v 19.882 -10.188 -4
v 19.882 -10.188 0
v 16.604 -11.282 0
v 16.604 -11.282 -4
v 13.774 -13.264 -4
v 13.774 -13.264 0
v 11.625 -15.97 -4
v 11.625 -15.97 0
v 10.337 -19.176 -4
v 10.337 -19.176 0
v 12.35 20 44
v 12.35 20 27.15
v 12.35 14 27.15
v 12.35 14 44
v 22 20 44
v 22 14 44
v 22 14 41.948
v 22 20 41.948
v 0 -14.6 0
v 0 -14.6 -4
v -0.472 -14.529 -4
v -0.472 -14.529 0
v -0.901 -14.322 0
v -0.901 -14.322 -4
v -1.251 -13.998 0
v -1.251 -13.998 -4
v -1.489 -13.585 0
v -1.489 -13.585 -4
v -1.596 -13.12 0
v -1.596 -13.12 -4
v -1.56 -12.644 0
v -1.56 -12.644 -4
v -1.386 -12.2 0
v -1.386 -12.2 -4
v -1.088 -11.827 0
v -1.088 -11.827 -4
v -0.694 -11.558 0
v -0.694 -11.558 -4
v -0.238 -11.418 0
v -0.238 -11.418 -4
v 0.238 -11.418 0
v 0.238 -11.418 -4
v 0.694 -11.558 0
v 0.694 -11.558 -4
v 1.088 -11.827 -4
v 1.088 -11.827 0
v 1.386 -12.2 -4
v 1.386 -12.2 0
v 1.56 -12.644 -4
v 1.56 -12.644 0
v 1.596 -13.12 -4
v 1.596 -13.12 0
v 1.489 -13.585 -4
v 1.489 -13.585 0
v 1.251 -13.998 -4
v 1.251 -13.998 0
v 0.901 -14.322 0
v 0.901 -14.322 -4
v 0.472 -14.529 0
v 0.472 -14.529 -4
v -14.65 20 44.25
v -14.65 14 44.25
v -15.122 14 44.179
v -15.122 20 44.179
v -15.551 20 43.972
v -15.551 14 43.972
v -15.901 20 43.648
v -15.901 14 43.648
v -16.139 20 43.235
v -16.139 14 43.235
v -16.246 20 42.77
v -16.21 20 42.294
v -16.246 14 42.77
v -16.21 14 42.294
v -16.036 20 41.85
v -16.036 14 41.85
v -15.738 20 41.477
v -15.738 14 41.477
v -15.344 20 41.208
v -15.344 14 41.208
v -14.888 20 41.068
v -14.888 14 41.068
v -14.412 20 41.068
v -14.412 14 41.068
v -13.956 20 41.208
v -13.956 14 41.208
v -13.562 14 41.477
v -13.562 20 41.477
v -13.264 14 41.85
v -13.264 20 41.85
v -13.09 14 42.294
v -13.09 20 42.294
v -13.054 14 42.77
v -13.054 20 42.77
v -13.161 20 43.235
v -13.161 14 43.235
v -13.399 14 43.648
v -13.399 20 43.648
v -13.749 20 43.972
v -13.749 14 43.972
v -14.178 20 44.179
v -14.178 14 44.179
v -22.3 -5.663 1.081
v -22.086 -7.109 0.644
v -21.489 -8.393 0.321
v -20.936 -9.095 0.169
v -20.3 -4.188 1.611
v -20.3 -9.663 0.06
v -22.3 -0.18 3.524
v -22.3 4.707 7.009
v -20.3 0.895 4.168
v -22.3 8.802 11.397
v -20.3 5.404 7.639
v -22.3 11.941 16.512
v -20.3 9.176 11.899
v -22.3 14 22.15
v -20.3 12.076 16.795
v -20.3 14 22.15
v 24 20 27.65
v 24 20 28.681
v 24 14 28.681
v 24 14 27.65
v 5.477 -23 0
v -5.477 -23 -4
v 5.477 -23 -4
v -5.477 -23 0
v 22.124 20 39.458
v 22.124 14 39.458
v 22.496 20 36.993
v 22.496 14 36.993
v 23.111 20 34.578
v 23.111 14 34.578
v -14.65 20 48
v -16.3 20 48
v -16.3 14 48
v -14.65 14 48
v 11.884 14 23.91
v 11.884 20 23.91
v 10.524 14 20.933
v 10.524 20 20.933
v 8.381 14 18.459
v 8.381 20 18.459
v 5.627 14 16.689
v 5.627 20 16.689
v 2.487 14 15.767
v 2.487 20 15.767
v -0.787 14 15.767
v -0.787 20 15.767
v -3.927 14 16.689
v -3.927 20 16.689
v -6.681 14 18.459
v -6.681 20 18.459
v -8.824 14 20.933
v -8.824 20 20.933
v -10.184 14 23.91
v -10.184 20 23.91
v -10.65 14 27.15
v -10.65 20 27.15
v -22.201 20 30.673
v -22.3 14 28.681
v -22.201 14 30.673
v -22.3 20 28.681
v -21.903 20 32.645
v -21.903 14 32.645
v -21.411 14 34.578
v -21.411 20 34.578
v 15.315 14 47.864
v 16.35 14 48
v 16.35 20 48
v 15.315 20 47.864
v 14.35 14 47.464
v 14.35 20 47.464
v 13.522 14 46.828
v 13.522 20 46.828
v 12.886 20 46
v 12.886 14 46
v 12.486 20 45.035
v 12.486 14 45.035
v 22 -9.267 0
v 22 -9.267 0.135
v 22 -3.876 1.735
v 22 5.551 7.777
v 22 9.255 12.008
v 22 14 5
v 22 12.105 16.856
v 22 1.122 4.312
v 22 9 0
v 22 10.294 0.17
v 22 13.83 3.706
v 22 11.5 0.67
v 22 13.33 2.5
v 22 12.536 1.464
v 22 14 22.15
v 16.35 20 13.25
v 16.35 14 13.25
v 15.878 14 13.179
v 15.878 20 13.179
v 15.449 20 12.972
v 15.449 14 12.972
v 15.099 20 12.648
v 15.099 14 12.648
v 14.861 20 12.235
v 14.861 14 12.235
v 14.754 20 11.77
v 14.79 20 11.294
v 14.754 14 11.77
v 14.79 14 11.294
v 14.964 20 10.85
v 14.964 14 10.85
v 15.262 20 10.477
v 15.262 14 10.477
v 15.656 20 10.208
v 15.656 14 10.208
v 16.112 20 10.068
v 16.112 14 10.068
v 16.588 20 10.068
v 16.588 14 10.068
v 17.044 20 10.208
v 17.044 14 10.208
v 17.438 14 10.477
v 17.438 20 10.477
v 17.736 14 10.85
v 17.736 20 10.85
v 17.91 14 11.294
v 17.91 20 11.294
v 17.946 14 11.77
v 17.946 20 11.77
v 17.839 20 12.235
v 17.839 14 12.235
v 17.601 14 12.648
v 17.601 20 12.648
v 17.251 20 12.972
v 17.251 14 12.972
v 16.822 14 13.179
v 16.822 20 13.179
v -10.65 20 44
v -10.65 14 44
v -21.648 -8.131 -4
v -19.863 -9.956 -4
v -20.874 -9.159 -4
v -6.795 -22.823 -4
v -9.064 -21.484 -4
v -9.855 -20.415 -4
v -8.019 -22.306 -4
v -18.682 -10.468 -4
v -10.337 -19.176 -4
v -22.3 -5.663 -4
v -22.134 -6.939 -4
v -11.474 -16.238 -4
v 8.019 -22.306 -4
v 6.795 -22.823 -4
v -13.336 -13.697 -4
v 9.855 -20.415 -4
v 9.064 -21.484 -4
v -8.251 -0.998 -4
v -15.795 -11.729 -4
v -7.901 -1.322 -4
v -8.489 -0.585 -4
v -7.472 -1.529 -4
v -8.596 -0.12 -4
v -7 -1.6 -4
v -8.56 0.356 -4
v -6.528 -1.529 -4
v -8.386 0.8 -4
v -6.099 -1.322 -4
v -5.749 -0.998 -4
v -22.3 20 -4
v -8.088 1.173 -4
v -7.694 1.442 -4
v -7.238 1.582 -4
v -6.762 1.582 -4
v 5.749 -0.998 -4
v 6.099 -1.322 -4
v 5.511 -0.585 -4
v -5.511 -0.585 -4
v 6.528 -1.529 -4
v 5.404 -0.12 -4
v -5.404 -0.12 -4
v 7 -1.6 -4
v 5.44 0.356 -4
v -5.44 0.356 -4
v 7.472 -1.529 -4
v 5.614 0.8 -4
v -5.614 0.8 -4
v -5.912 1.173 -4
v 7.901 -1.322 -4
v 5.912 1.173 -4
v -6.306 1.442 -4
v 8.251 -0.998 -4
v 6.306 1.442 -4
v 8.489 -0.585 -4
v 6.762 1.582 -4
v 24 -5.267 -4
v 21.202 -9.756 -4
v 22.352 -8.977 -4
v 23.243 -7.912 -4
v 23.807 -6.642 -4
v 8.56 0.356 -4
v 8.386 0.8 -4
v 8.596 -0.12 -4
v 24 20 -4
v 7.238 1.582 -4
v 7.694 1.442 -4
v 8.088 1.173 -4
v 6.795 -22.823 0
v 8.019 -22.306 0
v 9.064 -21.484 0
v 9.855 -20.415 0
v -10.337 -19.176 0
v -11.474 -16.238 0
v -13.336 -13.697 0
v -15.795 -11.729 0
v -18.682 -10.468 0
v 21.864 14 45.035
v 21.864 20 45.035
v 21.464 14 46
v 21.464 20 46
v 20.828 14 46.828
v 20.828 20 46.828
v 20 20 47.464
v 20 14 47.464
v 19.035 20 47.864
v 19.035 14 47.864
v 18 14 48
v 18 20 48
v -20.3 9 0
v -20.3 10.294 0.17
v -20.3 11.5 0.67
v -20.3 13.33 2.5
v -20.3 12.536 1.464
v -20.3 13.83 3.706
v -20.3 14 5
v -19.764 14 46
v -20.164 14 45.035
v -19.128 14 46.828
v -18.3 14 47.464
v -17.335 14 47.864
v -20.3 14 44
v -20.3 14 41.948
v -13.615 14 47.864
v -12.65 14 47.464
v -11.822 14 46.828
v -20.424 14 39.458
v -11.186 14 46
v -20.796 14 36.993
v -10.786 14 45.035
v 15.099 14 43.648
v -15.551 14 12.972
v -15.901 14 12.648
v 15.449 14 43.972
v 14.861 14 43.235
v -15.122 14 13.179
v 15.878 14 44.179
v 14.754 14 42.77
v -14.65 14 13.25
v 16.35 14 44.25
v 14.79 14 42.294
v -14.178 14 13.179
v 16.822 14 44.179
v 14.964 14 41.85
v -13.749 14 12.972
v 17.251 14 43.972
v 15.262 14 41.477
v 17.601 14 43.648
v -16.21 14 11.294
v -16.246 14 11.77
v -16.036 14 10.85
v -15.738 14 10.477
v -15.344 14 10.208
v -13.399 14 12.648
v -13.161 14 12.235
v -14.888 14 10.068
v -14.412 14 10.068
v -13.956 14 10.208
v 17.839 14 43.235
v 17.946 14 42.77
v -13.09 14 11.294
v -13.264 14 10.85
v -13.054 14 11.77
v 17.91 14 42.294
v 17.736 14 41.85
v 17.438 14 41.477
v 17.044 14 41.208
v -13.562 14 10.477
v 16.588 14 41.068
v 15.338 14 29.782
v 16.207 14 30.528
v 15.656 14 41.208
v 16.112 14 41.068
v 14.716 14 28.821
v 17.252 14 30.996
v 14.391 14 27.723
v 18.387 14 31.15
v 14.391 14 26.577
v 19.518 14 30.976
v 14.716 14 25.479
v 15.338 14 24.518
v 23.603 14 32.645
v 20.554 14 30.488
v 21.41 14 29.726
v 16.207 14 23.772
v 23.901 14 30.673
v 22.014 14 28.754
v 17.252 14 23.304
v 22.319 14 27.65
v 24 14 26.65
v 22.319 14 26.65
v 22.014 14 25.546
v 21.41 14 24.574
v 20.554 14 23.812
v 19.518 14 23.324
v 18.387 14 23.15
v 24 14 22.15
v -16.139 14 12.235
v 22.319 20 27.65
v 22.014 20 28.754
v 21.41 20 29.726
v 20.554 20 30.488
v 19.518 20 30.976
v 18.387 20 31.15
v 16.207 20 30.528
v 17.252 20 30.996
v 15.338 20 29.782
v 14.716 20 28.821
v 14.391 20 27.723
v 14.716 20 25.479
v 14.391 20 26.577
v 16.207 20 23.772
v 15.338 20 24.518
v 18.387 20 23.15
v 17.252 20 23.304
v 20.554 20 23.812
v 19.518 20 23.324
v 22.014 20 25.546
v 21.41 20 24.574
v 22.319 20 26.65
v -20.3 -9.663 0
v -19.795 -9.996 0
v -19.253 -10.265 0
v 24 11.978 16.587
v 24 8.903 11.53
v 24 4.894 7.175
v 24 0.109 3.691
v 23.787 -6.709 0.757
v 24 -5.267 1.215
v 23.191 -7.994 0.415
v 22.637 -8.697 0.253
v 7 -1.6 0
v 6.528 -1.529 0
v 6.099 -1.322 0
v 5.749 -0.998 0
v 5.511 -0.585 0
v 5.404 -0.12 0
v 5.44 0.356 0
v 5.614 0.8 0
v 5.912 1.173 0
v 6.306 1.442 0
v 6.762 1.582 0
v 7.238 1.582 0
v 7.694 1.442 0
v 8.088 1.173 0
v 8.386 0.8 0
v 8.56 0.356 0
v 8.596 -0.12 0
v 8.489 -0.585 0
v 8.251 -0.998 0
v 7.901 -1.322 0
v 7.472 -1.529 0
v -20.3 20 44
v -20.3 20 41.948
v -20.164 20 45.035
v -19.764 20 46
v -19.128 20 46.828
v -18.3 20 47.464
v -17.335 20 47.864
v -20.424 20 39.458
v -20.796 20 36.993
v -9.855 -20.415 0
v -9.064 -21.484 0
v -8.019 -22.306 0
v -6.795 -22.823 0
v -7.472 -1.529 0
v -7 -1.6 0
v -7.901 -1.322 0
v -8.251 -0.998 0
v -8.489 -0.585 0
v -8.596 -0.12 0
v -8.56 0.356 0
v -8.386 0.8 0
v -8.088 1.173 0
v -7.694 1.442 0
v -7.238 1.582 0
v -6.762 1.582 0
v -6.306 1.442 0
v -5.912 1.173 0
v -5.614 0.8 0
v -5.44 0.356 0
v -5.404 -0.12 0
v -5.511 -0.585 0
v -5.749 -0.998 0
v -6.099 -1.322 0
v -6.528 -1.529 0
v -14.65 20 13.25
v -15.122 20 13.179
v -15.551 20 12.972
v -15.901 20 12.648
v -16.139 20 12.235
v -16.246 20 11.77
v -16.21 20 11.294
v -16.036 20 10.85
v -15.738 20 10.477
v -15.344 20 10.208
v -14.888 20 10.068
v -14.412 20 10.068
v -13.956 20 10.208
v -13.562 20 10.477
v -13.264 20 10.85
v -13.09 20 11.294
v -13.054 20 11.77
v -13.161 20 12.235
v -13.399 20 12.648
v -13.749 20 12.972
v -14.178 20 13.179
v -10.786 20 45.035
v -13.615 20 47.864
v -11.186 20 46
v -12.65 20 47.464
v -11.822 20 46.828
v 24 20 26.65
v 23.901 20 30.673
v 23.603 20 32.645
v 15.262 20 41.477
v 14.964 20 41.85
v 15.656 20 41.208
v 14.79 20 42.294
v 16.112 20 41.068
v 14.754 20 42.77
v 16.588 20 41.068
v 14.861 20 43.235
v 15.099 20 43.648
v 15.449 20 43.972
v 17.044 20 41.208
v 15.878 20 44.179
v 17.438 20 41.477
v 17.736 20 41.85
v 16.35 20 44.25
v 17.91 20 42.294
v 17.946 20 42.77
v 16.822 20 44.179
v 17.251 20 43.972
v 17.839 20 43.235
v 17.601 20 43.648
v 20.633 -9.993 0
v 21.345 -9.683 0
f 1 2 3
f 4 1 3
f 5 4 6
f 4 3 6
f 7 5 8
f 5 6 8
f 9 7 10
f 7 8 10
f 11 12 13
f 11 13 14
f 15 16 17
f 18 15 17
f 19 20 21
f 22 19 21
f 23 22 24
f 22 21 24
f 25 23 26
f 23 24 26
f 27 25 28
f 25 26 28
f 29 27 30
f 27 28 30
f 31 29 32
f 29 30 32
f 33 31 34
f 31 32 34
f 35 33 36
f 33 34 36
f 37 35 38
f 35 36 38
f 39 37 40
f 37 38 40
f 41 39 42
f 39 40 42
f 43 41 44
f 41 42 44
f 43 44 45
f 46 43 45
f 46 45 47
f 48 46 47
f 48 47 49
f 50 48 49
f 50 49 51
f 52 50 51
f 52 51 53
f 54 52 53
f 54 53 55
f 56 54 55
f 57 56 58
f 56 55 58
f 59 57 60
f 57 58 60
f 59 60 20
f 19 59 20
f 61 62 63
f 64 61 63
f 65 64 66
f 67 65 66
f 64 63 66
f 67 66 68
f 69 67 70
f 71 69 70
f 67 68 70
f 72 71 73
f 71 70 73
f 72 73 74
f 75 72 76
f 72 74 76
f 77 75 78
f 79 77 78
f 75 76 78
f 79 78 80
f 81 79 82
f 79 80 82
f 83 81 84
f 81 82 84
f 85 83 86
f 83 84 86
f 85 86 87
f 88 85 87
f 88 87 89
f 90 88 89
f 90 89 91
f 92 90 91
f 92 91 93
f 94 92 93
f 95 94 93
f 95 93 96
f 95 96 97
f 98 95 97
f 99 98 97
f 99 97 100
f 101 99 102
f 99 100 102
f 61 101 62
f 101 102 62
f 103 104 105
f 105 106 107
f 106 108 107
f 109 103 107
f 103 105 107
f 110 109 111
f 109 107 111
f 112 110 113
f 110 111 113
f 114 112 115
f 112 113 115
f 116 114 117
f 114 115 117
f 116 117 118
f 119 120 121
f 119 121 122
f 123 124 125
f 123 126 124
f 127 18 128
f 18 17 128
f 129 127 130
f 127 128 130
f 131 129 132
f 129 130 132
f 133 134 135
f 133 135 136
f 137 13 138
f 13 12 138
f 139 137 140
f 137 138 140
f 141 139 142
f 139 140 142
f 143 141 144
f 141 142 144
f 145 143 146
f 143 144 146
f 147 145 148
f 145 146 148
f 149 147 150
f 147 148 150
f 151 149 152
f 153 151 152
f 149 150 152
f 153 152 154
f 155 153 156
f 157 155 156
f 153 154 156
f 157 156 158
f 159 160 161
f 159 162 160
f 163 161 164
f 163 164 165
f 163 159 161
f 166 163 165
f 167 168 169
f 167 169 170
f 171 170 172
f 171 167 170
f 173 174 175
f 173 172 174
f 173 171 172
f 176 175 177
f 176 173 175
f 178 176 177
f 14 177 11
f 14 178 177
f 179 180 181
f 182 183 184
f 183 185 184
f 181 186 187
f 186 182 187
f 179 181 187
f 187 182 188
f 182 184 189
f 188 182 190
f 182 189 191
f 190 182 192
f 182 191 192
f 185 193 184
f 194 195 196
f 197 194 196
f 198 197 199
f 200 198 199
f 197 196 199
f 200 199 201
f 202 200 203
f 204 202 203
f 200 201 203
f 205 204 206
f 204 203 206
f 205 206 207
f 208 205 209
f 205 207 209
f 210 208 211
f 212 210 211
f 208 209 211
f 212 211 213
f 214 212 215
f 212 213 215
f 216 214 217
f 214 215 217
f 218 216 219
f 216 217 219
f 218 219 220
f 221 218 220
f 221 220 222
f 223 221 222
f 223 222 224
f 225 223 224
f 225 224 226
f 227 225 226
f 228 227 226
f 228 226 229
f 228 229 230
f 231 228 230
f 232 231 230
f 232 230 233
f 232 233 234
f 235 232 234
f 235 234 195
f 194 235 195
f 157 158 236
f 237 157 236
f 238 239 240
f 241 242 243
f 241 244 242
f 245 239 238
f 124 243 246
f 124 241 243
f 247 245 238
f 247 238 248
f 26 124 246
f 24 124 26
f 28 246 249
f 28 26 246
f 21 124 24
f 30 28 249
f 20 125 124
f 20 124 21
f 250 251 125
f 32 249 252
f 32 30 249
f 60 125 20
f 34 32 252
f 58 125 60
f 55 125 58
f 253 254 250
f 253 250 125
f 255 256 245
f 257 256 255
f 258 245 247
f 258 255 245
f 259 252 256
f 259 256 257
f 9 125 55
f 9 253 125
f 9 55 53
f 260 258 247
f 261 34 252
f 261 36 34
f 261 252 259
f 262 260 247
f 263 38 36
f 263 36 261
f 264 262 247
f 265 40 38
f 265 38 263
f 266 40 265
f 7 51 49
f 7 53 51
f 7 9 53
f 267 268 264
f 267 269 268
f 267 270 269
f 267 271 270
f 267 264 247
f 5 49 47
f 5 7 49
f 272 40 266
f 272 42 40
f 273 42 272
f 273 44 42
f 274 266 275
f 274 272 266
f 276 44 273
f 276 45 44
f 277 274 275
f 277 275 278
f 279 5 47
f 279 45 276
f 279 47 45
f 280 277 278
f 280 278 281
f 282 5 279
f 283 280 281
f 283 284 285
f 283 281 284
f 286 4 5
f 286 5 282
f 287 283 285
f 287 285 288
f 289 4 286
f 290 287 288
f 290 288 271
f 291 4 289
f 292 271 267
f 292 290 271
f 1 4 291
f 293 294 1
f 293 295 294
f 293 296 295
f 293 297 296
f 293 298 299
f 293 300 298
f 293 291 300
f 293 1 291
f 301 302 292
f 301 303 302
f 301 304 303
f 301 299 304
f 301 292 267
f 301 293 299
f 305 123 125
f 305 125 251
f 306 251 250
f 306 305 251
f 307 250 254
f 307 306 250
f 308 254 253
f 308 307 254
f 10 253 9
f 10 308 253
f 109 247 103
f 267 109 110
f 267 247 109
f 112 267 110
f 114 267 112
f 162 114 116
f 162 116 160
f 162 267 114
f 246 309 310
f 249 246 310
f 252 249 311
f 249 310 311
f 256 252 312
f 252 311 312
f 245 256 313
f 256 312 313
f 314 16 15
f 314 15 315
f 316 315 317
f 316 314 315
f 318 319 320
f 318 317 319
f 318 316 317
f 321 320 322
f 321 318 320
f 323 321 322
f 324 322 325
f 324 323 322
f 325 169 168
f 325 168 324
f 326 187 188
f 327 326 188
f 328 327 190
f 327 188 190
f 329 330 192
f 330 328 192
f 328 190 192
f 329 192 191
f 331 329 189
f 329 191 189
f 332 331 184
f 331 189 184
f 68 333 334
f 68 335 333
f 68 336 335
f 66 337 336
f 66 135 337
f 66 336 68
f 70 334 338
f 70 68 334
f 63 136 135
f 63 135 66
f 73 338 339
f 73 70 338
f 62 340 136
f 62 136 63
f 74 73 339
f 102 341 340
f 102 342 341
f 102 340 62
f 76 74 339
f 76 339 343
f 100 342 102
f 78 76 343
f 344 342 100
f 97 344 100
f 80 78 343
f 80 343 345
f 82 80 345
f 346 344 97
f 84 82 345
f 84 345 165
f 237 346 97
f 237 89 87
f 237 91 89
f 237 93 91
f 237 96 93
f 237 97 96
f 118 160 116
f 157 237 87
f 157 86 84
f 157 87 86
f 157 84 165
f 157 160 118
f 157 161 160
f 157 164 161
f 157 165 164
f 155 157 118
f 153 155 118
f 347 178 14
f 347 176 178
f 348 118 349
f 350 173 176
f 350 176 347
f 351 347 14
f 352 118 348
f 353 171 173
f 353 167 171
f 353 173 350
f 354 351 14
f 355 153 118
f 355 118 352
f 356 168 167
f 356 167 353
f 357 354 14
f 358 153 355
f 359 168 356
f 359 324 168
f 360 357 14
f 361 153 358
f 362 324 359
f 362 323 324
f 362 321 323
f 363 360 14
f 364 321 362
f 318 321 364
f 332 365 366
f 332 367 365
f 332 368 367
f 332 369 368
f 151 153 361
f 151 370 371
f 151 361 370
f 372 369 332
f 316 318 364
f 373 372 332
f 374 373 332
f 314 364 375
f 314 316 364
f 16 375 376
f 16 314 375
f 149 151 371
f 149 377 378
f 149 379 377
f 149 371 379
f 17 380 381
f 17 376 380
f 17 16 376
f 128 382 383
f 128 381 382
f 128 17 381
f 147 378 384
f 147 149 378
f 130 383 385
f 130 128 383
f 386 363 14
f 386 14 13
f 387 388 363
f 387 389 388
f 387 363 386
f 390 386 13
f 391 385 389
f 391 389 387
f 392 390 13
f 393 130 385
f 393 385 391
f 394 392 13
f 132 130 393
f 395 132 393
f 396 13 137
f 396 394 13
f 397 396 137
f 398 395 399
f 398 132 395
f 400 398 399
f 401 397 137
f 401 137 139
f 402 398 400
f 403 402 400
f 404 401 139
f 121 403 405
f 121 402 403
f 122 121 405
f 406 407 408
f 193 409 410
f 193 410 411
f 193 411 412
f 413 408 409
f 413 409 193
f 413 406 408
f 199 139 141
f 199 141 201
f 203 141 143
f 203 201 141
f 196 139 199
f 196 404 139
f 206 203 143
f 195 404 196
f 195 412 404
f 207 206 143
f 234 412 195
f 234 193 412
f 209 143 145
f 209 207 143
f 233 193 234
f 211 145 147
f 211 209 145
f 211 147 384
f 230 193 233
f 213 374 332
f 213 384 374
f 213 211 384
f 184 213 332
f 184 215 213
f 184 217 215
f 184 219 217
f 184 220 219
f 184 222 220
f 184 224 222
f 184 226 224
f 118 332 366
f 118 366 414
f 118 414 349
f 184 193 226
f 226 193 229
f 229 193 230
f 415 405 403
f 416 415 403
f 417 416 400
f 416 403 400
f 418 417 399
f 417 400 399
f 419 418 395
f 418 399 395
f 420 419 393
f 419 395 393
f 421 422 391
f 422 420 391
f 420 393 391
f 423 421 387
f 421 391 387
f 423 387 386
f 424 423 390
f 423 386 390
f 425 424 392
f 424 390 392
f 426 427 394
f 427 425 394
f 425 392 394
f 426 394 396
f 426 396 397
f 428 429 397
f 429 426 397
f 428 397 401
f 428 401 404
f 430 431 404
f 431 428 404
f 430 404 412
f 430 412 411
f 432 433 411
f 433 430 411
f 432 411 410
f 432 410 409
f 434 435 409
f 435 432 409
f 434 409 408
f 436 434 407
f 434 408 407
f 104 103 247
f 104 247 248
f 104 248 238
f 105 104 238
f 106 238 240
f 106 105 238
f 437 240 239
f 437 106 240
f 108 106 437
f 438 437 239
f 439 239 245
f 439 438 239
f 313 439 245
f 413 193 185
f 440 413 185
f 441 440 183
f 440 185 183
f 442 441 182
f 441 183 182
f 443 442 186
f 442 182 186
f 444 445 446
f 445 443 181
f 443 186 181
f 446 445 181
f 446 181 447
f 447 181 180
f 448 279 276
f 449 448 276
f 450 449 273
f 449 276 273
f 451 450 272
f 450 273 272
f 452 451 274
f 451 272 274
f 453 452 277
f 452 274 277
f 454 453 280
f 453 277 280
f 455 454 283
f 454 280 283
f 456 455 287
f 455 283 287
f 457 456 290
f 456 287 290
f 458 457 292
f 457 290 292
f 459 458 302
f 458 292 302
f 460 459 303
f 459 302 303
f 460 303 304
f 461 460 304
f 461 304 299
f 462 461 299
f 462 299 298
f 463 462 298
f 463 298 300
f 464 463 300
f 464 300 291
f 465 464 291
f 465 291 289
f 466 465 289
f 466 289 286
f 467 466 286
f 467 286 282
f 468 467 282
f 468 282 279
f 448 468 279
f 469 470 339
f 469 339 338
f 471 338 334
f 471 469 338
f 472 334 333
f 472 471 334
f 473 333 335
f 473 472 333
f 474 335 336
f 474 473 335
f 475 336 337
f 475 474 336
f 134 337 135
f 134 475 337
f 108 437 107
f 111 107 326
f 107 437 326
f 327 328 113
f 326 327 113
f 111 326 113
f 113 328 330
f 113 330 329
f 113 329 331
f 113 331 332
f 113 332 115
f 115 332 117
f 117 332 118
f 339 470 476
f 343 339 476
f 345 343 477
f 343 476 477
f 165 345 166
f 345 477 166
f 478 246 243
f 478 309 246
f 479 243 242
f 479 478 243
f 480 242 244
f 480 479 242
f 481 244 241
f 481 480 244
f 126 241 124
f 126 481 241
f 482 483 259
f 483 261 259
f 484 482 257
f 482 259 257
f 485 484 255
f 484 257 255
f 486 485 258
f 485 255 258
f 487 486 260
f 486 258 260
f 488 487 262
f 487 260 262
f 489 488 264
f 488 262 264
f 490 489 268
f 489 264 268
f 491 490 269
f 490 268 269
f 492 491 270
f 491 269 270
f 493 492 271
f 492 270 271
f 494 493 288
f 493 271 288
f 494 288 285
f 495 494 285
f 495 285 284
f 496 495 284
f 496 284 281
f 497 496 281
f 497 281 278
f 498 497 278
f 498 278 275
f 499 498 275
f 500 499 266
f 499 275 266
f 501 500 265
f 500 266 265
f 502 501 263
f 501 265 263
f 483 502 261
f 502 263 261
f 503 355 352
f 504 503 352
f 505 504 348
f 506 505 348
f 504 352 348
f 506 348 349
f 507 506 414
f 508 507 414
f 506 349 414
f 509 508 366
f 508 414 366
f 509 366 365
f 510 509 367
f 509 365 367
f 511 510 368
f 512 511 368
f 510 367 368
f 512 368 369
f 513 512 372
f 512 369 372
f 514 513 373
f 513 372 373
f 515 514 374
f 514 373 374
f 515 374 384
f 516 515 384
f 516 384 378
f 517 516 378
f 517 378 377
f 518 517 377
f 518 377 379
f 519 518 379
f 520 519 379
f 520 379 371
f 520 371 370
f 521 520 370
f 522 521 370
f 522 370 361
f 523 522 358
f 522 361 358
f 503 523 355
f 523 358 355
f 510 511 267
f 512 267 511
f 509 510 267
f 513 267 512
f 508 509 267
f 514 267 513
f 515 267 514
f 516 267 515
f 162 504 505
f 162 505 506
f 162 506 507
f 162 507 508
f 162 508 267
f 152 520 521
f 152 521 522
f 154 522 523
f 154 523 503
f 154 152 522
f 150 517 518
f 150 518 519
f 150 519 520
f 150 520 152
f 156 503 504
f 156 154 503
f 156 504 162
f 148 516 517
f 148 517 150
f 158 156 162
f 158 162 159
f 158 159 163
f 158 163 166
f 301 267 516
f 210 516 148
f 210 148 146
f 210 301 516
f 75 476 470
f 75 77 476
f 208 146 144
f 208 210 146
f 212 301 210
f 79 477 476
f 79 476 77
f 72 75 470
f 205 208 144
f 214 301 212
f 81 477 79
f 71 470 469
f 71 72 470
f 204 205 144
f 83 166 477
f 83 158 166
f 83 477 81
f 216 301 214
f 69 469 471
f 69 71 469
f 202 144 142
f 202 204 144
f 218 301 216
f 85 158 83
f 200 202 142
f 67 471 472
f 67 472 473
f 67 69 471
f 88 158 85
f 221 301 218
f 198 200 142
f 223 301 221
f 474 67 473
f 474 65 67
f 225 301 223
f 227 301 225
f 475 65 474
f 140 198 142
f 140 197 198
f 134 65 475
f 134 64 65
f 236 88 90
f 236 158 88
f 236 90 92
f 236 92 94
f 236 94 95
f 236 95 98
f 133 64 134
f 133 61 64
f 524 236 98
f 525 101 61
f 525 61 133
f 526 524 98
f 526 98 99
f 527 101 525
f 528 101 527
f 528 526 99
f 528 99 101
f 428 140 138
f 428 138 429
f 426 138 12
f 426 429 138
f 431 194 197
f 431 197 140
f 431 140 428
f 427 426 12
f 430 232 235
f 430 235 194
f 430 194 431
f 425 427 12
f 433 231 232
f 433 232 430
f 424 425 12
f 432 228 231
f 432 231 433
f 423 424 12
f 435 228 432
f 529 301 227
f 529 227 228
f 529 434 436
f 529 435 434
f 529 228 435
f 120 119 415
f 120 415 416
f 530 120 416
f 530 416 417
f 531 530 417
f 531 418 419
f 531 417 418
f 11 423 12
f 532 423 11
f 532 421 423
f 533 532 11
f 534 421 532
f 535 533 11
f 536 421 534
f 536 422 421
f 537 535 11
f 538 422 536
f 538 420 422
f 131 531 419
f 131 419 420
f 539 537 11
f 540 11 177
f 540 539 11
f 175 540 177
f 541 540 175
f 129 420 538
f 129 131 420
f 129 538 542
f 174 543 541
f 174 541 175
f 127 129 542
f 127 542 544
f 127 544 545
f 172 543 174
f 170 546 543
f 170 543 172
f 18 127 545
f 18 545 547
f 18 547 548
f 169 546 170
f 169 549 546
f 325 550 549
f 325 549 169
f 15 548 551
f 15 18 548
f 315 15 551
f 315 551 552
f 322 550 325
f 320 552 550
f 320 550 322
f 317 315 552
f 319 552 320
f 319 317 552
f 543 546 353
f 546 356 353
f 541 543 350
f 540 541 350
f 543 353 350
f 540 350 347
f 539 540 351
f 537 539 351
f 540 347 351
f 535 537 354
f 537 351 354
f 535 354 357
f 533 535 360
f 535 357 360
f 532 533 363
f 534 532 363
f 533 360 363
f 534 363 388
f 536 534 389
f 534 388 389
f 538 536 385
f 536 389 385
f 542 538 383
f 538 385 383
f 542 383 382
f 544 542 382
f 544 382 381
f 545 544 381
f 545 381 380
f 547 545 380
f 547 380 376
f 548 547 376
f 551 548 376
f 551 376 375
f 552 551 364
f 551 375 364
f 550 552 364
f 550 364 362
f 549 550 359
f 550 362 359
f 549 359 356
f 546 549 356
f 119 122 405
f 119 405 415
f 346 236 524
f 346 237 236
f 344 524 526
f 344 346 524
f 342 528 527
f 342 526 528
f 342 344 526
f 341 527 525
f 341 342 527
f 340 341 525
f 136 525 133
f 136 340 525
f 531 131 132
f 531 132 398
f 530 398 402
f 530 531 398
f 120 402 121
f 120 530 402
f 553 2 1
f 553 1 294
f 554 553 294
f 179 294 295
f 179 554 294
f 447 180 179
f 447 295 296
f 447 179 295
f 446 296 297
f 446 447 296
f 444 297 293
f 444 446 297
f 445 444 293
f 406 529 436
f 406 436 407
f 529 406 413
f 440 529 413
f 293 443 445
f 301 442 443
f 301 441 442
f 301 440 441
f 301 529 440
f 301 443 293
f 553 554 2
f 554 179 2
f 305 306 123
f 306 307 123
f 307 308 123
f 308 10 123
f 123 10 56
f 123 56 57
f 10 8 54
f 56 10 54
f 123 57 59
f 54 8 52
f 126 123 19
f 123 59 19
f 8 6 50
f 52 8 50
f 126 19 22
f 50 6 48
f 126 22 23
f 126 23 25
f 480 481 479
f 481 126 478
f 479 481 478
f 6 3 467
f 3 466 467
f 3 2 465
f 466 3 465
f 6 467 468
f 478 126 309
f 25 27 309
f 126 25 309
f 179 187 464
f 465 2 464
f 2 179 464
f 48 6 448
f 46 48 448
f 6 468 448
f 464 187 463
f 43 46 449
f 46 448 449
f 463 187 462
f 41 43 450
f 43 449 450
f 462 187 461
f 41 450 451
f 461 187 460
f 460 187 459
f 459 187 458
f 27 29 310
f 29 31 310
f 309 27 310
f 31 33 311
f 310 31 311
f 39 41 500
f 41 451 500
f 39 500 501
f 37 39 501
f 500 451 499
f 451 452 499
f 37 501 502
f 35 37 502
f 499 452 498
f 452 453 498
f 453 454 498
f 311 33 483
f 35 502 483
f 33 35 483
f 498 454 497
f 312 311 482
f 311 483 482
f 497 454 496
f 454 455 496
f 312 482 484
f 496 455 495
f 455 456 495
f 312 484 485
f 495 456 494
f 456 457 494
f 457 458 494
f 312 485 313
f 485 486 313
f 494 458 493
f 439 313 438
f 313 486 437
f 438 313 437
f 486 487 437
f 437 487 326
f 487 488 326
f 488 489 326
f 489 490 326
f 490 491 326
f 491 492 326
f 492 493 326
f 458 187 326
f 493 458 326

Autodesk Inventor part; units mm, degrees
ref_plane "YZ Plane" through (0, 0, 0) normal (1, 0, 0) x (0, 1, 0)
ref_plane "XZ Plane" through (0, 0, 0) normal (0, 1, 0) x (-1, 0, 0)
ref_plane "XY Plane" through (0, 0, 0) normal (0, 0, 1) x (1, 0, 0)
sketch "hole points" plane through (0, 0, 0) normal (0, 0, 1) x (1, 0, 0)
  line L0 (-7, 0) -> (7, 0) construction
  line L1 (0, 0) -> (0, -13) construction
  dimension "d0" = 14
  dimension "d1" = 13
sketch "Sketch3" plane through (0, 0, 0) normal (0, 0, 1) x (1, 0, 0)
  line L0 (-7, 0) -> (7, 0) construction
  line L1 (-7, 0) -> (7, 0) construction
  line L2 (-9, -2) -> (9, -2)
  line L3 (9, -2) -> (9, 2)
  line L4 (9, 2) -> (-9, 2)
  line L5 (-9, 2) -> (-9, -2)
  line L6 (-9, -2) -> (9, 2) construction
  line L7 (9, -2) -> (-9, 2) construction
  line L8 (0, 0) -> (0, -13) construction
  line L9 (-2, 2) -> (2, 2)
  line L10 (2, 2) -> (2, -15)
  line L11 (2, -15) -> (-2, -15)
  line L12 (-2, -15) -> (-2, 2)
  line L13 (17, -10) -> (-17, -10)
  line L14 (-17, -10) -> (-17, 10)
  line L15 (-17, 10) -> (17, 10)
  line L16 (17, 10) -> (17, -10)
  line L17 (10, -23) -> (10, 10)
  line L18 (10, 10) -> (-10, 10)
  line L19 (-10, 10) -> (-10, -23)
  line L20 (-10, -23) -> (10, -23)
  point P0 (0, -6.5)
  point P1 (0, 2)
  point P2 (0, -6.5)
  point P3 (0, 2)
  dimension "d31" = 18
  dimension "d32" = 4
  dimension "d33" = 4
  dimension "d34" = 17
  dimension "d35" = 8
  dimension "d36" = 8
extrude "back plate Extrusion2" add sketch "Sketch3" against normal blind 4
hole "Hole3" at (-7, 0, 0) at (7, 0, 0) at (0, -13, 0) direction (0, 0, -1) diameter 3.2 end through all
sketch "Sketch4" plane through (-17, 10, 0) normal (0, 1, 0) x (1, 0, 0)
  circle A0 centre (17.85, -27.15) radius 11 projected
  circle A1 centre (2.35, -42.65) radius 1.5 projected
  circle A2 centre (33.35, -11.65) radius 1.5 projected
  circle A3 centre (33.35, -42.65) radius 1.5 projected
  circle A4 centre (2.35, -11.65) radius 1.5 projected
  line L0 (-3.3, -10) -> (0.7, -6) projected
  line L1 (-3.3, -44.3) -> (-3.3, -10) projected
  line L2 (0.7, -48.3) -> (-3.3, -44.3) projected
  line L3 (35, -48.3) -> (0.7, -48.3) projected
  line L4 (39, -44.3) -> (35, -48.3) projected
  line L5 (39, -10) -> (39, -44.3) projected
  line L6 (35, -6) -> (39, -10) projected
  line L7 (0.7, -6) -> (35, -6) projected
  line L8 (-3.3, 0) -> (39, 0)
  line L9 (39, 0) -> (39, 4)
  line L10 (39, 4) -> (-3.3, 4)
  line L11 (-3.3, 4) -> (-3.3, 0)
  line L12 (0, 4) -> (34, 4) projected
  point P0 (17, 0)
  point P1 (17.85, 4)
  point P2 (17, 4)
  point P3 (-3.3, 2)
  point P4 (39, 2)
  dimension "d44" = 4
extrude "Extrusion3" add sketch "Sketch4" along normal blind 10 contours L11 L10 L9 L8
sketch "Sketch5" plane through (0, 0, 0) normal (0, 0, 1) x (1, 0, 0)
  line L0 (-16.3, 14) -> (18, 14) projected
  line L1 (-20.3, 20) -> (22, 20)
  line L2 (22, 20) -> (22, 14)
  line L3 (22, 14) -> (-20.3, 14)
  line L4 (-20.3, 14) -> (-20.3, 20)
  point P0 (0, 0)
  dimension "d47" = 42.3
extrude "Extrusion4" add sketch "Sketch5" along normal blind 48
sketch "Sketch6" plane through (-17, 20, 0) normal (0, 1, 0) x (1, 0, 0)
  circle A0 centre (17.85, -27.15) radius 10.5 projected
  circle A1 centre (17.85, -27.15) radius 11.5
  circle A2 centre (2.35, -42.65) radius 1.5 construction
  circle A3 centre (33.35, -42.65) radius 1.5 construction
  circle A4 centre (33.35, -11.65) radius 1.5 construction
  circle A5 centre (2.35, -11.65) radius 1.5 construction
  line L0 (6.35, -27.15) -> (6.35, -48)
  line L1 (39, -48) -> (-3.3, -48) projected
  line L2 (29.35, -27.15) -> (29.35, -48)
  line L3 (29.35, -48) -> (6.35, -48)
  point P0 (17, 0)
  dimension "d50" = 1
extrude "Extrusion5" cut sketch "Sketch6" against normal through all contours A0 | A1 | L2 L1 L0 A1
sketch "Sketch7" plane through (-17, 20, 0) normal (0, 1, 0) x (1, 0, 0)
  circle A0 centre (2.35, -42.65) radius 1.5 projected
  circle A1 centre (33.35, -42.65) radius 1.5 projected
  circle A2 centre (33.35, -11.65) radius 1.5 projected
  circle A3 centre (2.35, -11.65) radius 1.5 projected
  point P0 (17, 0)
hole "Hole4" at (-14.65, 20, 11.65) at (16.35, 20, 11.65) at (16.35, 20, 42.65) at (-14.65, 20, 42.65) direction (0, -1, 0) diameter 3.2 end through all
sketch "Sketch8" plane through (22, 10, 0) normal (1, 0, 0) x (0, 0, -1)
  line L0 (-24.65, 27.5) -> (-29.65, 27.5) projected
  line L1 (-22.15, 4) -> (-32.15, 4)
  line L2 (-32.15, 4) -> (-32.15, 10)
  line L3 (-32.15, 10) -> (-22.15, 10)
  line L4 (-22.15, 10) -> (-22.15, 4)
  point P0 (0, -10)
  point P1 (-27.15, 10)
  point P2 (-27.15, 27.5)
  point P3 (-27.15, 10)
  dimension "d62" = 10
  dimension "d63" = 6
extrude "Extrusion6" add sketch "Sketch8" along normal blind 2
sketch "Sketch9" plane through (-17, 20, 0) normal (0, 1, 0) x (1, 0, 0)
  circle A0 centre (17.85, -27.15) radius 2.5 construction
  line L0 (17.85, -27.15) -> (35.35, -27.15) construction
  point P0 (17, 0)
  dimension "d66" = 17.5
hole "Hole5" at (18.35, 20, 27.15) direction (0, -1, 0) diameter 8 end through all
sketch "Sketch10" plane through (24, 10, 0) normal (1, 0, 0) x (0, 0, -1)
  line L0 (-32.15, 4) -> (-22.15, 4) projected
  line L1 (-22.15, 4) -> (-22.15, 10) projected
  line L2 (-22.15, 10) -> (-32.15, 10) projected
  line L3 (-32.15, 10) -> (-32.15, 4) projected
  line L4 (-27.65, 10) -> (-26.65, 10)
  line L5 (-26.65, 10) -> (-26.65, 4)
  line L6 (-26.65, 4) -> (-27.65, 4)
  line L7 (-27.65, 4) -> (-27.65, 10)
  line L8 (-22.15, 10) -> (-32.15, 10) projected
  point P0 (0, -10)
  point P1 (-27.15, 10)
  point P2 (-27.15, 10)
  point P3 (-27.15, 10)
  dimension "d74" = 1
  dimension "d75" = 6
extrude "Extrusion7" cut sketch "Sketch10" against normal blind 5 contours L7 L2 L5 L0
sketch "Sketch11" plane through (-17, -10, -4) normal (-1, 0, 0) x (0, 0, 1)
  line L0 (4, 0) -> (4, 20) projected
  line L1 (4, 20) -> (0, 20) projected
  line L2 (0, 0) -> (0, 20) projected
  line L3 (4, 0) -> (0, 0) projected
  point P0 (4, 10)
extrude "Extrusion8" add sketch "Sketch11" along normal blind 3.3
sketch "Sketch12" plane through (17, -10, 0) normal (1, 0, 0) x (0, 0, -1)
  line L0 (0, 20) -> (0, 0) projected
  line L1 (0, 0) -> (4, 0) projected
  line L2 (4, 20) -> (4, 0) projected
  line L3 (0, 20) -> (4, 20) projected
  point P0 (0, 10)
extrude "Extrusion9" add sketch "Sketch12" along normal blind 5
fillet "Fillet3" radius 4 4 edges at (22, 17, 48) (12.35, 17, 48) (-10.65, 17, 48) (-20.3, 17, 48)
fillet "Fillet6" radius 5 1 edges at (0.85, 14, 0)
sketch "Sketch15" plane through (22, -10, -4) normal (1, 0, 0) x (0, 0, -1)
  line L0 (-26.15, 30) -> (-26.15, 24) projected
  line L1 (-9, 24) -> (-26.15, 24) projected
  arc A0 (-4, 19) -> (-9, 24) centre (-9, 19) ccw projected
  line L2 (-4, 0) -> (-4, 19) projected
  line L3 (-4, 0) -> (0, 0) projected
  line L4 (0, 0) -> (0, 30) projected
  line L5 (0, 30) -> (-26.15, 30) projected
  arc A1 (-4, 0) -> (-26.15, 24) centre (-33.5688, -5.0682) ccw
  line L6 (-26.15, 24) -> (-26.15, 30)
  line L7 (-26.15, 30) -> (0, 30)
  line L8 (0, 30) -> (-26.15, 30) projected
  line L9 (0, 30) -> (0, 0)
  line L10 (0, 0) -> (0, 30) projected
  line L11 (0, 0) -> (-4, 0)
  point P0 (-4, 10)
  dimension "d97" = 30
extrude "Extrusion12" add sketch "Sketch15" along normal blind 2
sketch "Sketch16" plane through (-20.3, -10, -4) normal (-1, 0, 0) x (0, 0, 1)
  line L0 (30.65, 30) -> (30.65, 24) projected
  line L1 (30.65, 24) -> (26.15, 24) projected
  arc A0 (26.15, 24) -> (4, 0) centre (33.5688, -5.0682) ccw projected
  line L2 (4, 0) -> (0, 0) projected
  line L3 (0, 0) -> (0, 30) projected
  line L4 (0, 30) -> (30.65, 30) projected
  point P0 (4, 10)
extrude "Extrusion13" add sketch "Sketch16" along normal blind 2
fillet "Fillet10" radius 12 2 edges at (-10, -10, -2) (10, -10, -2)
fillet "Fillet11" radius 5 4 edges at (-22.3, -10, -2) (-10, -23, -2) (10, -23, -2) (24, -10, -2)
sketch "Sketch17" plane through (-20.3, 14, 26.65) normal (0, 0, 1) x (1, 0, 0)
  line L0 (0, 6) -> (0, 0) projected
  line L1 (0, 6) -> (-2, 6) projected
  line L2 (-2, 0) -> (-2, 6) projected
  line L3 (0, 0) -> (-2, 0) projected
  point P0 (20.3, -14)
extrude "Extrusion14" add sketch "Sketch17" along normal blind 5.5
fillet "Fillet14" radius 25 2 edges at (-20.3, 17, 32.15) (22, 17, 32.15)
fillet "Fillet15" radius 20 2 edges at (-22.3, 17, 32.15) (24, 17, 32.15)
properties part number "bottom-right bracket" material "ABS Plastic"
